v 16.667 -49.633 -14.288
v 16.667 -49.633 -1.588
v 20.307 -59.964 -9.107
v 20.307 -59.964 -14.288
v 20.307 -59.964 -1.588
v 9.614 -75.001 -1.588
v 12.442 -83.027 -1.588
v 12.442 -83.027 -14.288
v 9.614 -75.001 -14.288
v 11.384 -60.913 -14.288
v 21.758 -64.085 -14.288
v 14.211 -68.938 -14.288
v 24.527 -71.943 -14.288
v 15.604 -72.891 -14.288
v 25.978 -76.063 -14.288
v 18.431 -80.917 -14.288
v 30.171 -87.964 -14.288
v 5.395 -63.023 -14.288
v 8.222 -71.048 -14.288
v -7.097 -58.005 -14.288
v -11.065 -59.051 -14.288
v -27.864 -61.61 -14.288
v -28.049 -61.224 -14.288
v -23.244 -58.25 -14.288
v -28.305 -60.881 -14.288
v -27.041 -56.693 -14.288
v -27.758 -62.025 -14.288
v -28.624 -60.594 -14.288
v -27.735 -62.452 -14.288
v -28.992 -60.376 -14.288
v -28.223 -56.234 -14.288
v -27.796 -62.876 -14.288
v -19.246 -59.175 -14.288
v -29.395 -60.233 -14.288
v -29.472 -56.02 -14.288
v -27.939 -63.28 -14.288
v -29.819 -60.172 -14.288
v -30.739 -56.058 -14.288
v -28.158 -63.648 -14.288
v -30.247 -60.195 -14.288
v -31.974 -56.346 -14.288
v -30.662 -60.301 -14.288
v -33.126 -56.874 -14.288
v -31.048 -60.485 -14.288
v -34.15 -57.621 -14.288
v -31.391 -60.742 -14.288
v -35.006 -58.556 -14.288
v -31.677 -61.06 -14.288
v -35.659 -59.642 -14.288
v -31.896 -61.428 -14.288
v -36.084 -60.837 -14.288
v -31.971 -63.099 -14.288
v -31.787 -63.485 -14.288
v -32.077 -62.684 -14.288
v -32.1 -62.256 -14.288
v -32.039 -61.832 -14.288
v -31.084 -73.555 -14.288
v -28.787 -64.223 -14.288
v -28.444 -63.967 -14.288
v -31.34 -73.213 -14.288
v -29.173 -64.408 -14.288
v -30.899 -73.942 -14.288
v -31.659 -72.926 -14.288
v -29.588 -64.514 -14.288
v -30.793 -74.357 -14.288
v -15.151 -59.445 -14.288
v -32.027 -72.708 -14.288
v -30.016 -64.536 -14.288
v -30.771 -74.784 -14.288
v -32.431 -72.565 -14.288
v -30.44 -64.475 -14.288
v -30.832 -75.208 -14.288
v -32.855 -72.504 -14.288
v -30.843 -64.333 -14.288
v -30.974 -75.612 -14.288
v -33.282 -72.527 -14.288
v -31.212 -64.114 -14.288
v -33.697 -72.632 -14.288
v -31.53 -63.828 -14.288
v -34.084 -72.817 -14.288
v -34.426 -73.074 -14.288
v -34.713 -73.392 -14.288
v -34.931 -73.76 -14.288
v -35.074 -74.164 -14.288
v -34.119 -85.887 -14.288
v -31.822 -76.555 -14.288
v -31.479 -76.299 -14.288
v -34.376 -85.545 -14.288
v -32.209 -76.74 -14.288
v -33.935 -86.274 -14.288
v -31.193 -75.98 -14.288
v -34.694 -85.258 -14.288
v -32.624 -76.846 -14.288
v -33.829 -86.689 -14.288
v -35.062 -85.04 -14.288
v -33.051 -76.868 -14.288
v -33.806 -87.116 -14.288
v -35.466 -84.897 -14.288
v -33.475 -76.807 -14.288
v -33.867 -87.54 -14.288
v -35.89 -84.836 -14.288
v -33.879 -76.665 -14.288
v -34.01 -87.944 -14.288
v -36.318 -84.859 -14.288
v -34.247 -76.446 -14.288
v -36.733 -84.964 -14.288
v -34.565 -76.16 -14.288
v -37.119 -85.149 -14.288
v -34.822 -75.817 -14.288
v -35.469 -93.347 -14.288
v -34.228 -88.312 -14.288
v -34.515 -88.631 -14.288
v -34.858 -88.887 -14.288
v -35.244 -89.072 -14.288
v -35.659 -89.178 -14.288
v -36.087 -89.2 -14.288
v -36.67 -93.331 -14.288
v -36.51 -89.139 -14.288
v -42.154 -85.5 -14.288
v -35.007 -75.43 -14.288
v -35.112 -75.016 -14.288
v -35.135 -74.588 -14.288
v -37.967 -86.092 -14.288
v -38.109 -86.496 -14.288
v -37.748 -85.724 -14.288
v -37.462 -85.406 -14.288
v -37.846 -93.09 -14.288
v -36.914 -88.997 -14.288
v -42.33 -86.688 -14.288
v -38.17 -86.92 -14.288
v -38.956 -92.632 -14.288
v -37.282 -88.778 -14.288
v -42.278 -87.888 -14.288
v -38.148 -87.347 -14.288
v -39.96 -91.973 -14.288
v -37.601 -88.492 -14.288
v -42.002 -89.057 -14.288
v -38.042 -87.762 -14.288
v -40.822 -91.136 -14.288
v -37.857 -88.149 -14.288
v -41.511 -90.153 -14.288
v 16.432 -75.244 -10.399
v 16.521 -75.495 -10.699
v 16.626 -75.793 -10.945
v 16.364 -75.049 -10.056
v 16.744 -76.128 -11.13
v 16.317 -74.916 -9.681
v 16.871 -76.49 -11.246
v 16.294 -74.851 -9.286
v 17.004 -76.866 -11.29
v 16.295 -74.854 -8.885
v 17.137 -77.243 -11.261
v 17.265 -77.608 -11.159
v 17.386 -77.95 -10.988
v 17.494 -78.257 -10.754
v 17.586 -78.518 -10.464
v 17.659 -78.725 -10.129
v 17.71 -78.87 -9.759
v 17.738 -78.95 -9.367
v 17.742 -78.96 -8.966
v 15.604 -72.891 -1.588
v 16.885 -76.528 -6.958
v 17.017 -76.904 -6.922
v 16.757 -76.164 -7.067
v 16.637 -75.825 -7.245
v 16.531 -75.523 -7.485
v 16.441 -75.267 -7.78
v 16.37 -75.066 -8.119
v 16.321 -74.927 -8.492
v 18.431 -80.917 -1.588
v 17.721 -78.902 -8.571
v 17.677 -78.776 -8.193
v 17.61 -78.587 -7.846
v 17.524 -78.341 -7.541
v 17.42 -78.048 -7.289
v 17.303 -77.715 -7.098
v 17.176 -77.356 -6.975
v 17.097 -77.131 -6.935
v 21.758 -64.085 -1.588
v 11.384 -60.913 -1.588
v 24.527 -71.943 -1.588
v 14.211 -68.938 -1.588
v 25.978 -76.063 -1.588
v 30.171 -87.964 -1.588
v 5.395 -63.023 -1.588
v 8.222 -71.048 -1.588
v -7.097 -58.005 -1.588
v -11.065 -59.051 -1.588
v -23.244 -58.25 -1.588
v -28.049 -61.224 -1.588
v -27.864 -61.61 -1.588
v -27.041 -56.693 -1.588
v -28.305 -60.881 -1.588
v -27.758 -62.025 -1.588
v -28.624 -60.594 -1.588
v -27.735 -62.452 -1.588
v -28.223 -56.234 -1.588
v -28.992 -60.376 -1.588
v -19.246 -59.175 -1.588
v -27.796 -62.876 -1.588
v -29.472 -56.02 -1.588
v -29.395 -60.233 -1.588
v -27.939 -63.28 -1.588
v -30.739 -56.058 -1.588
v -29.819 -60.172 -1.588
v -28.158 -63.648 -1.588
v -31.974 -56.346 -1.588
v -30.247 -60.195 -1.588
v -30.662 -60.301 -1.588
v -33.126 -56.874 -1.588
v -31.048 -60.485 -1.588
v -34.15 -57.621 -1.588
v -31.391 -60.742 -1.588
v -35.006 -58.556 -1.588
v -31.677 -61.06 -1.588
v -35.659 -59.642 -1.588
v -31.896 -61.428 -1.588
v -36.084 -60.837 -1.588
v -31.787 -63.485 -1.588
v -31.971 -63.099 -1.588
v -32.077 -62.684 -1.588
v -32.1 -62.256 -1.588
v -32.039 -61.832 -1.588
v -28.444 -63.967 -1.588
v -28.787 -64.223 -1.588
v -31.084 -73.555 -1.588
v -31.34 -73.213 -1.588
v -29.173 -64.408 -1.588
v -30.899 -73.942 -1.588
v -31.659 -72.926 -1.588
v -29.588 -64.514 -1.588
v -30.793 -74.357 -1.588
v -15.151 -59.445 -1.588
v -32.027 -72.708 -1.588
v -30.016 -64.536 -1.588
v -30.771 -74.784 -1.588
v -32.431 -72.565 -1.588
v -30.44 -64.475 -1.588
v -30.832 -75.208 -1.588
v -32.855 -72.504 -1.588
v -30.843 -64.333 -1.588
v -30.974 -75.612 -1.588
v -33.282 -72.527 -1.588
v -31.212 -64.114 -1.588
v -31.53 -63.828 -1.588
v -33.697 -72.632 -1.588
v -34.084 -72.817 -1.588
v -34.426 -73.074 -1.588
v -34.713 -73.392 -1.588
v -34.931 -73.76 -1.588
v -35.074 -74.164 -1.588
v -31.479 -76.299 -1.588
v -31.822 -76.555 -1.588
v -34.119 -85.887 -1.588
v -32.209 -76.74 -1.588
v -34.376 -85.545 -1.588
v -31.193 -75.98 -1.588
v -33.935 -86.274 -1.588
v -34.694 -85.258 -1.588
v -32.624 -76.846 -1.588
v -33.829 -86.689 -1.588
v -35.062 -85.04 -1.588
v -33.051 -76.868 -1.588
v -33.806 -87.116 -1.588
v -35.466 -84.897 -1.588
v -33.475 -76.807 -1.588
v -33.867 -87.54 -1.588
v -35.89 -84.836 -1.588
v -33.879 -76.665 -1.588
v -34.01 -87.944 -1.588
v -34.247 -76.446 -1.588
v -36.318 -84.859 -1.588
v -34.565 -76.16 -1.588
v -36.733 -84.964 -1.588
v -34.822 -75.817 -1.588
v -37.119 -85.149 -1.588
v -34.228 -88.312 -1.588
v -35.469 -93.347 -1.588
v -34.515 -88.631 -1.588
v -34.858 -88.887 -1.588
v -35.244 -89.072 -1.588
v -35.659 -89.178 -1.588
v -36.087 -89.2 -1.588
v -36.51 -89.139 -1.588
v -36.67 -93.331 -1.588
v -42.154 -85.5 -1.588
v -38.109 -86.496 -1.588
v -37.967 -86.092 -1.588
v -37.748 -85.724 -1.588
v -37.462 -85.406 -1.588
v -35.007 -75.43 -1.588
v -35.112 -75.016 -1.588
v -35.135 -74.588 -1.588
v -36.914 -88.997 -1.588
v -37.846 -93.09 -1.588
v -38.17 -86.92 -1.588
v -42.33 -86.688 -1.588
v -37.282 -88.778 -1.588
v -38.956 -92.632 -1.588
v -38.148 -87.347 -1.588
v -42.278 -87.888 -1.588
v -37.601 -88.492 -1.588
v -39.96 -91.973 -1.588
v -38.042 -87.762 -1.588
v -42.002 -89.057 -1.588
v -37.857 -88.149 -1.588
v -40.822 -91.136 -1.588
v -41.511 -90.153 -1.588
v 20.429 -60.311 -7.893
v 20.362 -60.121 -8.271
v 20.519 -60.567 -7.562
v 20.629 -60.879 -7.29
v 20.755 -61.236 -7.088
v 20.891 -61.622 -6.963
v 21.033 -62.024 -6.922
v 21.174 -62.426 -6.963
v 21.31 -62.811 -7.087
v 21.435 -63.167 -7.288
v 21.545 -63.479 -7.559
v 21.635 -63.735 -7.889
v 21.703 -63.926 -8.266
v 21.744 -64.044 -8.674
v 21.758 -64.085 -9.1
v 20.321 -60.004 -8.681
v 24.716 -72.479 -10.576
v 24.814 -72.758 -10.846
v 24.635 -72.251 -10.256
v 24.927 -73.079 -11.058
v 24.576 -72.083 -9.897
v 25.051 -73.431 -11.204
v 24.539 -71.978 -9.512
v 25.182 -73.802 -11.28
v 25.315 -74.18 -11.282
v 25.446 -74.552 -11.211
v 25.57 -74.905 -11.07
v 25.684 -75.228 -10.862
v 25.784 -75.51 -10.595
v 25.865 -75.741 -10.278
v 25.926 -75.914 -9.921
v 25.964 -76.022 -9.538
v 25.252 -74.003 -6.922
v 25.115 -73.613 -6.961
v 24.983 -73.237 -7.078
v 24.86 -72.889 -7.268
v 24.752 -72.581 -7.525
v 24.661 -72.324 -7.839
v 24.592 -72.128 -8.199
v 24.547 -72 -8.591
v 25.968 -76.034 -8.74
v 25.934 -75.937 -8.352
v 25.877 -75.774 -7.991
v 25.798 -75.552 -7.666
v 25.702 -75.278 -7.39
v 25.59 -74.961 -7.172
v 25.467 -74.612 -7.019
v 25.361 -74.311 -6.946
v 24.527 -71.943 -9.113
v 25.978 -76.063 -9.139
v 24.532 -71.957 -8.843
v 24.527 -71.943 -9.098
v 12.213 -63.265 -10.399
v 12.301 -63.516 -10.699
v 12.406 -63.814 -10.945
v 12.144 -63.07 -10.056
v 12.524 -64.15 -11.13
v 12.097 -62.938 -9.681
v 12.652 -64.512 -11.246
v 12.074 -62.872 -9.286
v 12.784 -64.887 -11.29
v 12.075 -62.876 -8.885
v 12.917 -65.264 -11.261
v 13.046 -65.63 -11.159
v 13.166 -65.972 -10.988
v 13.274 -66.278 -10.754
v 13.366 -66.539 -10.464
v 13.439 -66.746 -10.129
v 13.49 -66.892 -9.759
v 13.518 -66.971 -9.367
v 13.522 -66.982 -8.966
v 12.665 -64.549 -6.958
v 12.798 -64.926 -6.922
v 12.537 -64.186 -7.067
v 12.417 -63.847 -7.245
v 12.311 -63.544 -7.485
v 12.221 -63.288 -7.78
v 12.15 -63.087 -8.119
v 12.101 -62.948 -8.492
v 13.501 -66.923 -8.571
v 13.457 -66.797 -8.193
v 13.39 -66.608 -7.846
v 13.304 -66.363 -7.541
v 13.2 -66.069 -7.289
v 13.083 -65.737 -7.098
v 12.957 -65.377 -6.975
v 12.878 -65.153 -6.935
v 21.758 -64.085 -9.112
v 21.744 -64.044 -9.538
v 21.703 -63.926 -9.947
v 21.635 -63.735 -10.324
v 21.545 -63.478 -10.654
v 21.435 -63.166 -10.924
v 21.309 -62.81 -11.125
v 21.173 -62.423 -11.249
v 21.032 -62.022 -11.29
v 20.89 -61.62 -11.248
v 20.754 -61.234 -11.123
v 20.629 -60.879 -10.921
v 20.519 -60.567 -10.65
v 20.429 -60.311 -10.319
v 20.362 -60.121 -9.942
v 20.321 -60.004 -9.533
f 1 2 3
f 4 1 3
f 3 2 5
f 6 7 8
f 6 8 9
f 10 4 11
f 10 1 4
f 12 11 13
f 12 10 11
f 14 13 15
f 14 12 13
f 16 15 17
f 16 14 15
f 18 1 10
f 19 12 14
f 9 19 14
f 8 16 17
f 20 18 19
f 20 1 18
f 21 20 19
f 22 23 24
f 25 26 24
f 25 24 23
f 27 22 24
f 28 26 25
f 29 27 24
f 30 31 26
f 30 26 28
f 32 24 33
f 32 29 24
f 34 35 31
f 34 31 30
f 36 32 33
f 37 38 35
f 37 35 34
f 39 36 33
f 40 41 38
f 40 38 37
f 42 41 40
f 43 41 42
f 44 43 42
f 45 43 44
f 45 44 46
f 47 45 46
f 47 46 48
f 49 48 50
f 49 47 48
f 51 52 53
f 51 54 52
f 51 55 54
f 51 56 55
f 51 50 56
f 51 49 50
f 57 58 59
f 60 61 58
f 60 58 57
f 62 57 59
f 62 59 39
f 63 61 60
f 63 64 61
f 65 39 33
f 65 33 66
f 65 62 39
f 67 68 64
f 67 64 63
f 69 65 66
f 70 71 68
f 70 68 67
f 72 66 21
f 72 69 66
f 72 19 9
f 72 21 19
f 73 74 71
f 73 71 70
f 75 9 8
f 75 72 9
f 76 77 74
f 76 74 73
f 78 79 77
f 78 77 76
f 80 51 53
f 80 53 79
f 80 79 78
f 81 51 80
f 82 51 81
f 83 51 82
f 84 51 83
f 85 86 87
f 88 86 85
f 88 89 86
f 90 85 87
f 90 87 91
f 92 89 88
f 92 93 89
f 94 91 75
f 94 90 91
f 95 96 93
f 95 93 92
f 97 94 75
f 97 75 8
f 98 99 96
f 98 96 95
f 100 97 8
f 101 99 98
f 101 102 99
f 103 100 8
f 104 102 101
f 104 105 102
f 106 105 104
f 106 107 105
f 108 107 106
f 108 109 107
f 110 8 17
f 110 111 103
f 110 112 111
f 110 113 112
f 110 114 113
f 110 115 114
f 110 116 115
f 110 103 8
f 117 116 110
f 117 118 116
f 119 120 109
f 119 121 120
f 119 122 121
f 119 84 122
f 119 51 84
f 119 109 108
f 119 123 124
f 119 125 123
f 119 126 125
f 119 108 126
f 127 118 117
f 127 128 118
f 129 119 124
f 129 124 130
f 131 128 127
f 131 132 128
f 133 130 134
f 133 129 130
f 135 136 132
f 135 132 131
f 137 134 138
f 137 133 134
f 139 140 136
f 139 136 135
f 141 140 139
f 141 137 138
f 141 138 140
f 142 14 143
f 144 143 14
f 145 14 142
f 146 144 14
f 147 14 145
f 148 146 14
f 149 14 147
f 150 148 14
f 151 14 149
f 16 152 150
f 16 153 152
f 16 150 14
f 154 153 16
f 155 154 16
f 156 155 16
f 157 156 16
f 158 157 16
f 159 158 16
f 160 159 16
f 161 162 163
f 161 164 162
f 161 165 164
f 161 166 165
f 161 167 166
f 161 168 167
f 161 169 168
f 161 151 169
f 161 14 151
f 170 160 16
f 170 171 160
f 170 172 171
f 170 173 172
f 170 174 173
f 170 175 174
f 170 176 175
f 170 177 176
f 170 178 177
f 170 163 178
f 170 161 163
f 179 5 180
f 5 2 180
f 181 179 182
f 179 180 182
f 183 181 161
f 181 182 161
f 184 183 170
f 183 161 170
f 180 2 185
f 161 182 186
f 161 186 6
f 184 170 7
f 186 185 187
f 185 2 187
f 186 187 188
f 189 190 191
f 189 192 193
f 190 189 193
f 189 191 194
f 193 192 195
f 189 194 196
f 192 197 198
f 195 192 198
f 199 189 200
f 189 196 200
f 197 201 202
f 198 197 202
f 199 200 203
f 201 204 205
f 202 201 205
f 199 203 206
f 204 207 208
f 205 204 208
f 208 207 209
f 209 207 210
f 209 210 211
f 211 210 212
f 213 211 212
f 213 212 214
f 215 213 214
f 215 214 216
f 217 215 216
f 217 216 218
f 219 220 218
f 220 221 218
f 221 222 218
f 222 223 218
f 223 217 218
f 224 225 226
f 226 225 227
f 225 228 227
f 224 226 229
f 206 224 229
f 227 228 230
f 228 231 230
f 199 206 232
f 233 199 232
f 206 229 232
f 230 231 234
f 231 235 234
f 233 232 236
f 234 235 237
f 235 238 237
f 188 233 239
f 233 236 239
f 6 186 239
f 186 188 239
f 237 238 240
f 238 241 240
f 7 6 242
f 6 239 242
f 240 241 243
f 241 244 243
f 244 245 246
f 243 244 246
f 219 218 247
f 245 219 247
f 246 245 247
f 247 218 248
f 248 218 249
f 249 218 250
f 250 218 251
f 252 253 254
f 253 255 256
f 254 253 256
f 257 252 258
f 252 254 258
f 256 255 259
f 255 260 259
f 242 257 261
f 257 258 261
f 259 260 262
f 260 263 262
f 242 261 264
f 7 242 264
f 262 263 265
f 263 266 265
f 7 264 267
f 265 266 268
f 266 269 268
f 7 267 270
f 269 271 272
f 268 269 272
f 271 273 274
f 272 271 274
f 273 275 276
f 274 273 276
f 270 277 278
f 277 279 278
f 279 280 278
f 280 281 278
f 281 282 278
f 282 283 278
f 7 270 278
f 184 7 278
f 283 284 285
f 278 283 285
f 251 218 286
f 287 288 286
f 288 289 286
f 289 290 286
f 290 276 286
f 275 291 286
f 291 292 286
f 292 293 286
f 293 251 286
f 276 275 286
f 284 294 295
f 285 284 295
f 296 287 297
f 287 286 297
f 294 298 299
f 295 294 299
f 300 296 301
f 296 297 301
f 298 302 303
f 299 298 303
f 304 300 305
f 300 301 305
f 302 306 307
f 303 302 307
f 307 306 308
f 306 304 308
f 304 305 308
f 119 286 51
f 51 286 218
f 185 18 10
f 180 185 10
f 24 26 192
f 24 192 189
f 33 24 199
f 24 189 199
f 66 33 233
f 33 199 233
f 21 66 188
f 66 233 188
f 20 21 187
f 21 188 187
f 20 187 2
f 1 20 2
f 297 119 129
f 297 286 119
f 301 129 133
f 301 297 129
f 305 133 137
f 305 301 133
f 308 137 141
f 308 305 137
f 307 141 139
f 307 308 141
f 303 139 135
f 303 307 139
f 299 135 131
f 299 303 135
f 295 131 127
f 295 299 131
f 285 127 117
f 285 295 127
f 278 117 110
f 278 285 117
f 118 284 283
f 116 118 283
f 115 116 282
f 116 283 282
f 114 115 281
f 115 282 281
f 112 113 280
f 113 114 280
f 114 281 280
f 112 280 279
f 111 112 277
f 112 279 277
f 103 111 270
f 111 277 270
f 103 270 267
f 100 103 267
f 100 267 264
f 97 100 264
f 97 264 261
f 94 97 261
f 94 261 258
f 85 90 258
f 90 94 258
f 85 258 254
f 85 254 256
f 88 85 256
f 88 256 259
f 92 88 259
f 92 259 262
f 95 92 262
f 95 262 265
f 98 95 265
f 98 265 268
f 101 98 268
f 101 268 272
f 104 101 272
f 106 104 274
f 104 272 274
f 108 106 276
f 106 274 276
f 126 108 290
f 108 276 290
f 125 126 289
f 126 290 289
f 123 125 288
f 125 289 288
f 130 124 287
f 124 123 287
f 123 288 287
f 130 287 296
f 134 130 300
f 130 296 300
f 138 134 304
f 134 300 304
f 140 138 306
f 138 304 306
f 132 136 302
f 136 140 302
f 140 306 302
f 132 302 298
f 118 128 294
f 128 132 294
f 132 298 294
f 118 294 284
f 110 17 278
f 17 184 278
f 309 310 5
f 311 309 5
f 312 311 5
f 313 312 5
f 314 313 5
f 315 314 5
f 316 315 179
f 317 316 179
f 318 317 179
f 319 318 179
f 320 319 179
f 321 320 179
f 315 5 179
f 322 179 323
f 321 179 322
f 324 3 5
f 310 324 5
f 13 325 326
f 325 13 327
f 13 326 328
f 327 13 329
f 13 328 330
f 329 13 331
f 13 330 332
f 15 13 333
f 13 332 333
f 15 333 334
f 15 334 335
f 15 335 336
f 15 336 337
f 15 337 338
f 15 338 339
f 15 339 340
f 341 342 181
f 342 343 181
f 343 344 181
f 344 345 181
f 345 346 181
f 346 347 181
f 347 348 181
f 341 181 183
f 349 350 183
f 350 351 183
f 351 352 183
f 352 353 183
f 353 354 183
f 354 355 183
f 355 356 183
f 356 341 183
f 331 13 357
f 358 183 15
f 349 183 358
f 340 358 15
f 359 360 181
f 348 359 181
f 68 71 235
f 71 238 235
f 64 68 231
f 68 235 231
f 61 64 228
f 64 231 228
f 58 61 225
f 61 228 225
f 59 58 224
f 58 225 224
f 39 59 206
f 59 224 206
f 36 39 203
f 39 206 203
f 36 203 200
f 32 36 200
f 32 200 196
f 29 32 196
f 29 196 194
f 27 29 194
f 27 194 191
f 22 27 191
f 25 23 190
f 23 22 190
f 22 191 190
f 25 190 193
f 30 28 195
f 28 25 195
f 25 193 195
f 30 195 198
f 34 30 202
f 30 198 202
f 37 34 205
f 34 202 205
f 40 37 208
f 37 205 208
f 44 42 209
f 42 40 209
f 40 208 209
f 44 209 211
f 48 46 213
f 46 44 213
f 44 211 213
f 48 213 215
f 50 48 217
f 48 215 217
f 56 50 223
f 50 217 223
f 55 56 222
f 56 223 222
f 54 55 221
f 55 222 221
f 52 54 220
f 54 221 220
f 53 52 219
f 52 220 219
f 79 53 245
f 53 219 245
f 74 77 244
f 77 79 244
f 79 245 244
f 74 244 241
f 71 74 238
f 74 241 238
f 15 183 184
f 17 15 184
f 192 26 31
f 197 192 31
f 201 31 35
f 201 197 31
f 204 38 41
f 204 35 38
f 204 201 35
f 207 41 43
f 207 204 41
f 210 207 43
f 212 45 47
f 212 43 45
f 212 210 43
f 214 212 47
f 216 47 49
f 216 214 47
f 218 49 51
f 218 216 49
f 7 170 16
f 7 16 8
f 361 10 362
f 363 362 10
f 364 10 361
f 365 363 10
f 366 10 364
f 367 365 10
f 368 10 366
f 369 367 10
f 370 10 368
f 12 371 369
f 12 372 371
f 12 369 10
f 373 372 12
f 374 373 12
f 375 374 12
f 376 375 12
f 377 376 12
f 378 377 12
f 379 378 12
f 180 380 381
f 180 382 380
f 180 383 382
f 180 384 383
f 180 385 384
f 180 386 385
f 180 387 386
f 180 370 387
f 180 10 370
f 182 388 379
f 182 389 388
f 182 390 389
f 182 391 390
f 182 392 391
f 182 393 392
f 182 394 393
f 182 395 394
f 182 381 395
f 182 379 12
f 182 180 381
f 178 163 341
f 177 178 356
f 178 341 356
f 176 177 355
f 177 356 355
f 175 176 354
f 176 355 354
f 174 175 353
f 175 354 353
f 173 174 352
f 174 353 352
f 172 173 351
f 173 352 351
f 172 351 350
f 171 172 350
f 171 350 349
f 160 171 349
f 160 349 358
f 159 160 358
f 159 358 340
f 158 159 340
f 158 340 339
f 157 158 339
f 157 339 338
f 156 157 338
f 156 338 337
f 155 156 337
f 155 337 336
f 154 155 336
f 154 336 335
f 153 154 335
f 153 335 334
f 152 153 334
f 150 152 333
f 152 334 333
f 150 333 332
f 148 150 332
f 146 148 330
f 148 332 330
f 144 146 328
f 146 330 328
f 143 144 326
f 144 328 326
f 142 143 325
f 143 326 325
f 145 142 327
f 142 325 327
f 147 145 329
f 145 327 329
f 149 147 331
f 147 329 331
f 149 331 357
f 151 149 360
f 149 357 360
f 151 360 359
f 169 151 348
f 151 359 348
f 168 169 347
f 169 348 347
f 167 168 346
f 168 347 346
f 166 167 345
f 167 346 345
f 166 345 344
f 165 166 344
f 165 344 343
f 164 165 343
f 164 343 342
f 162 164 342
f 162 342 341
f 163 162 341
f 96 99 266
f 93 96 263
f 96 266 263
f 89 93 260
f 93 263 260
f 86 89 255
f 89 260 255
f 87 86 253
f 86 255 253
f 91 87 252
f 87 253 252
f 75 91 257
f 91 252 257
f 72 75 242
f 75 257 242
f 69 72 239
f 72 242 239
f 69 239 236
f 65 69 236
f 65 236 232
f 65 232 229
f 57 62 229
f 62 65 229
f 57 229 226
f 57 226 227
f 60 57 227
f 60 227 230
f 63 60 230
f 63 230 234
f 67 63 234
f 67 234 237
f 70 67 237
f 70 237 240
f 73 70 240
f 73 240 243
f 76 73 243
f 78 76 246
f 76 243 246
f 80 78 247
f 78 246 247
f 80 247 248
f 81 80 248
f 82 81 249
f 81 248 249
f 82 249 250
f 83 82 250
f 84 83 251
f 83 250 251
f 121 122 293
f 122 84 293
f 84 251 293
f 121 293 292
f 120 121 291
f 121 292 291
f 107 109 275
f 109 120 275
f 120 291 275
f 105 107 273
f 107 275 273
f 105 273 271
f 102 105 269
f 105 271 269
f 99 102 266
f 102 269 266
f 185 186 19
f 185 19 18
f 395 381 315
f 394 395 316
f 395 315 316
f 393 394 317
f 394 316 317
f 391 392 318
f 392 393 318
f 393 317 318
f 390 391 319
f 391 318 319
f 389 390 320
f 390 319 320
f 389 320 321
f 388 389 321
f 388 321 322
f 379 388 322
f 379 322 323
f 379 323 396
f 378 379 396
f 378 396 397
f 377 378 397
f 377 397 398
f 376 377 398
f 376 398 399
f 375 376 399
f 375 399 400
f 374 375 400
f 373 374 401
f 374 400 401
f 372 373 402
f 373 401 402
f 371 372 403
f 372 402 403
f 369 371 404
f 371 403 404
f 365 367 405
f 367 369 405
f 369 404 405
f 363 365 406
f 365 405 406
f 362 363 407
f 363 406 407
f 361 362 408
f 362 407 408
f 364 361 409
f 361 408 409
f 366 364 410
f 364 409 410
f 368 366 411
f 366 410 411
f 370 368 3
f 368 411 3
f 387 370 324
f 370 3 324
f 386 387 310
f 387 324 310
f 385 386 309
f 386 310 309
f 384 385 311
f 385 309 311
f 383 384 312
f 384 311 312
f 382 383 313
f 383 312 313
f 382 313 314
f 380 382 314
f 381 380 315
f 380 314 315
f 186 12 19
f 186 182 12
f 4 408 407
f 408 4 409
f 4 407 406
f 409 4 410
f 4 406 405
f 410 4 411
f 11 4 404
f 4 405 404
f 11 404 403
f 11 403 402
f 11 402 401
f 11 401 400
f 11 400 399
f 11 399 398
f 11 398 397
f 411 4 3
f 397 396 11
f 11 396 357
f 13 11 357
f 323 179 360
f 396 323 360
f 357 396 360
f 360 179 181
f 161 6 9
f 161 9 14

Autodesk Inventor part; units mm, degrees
ref_plane "YZ Plane" through (0, 0, 0) normal (1, 0, 0) x (0, 1, 0)
ref_plane "Work Plane1" through (-2.4446, 6.0882, -1.5875) normal (0, 0, -1) x (-0.239, -0.971, 0)
sketch "Sketch1" plane through (-2.4446, 6.0882, -1.5875) normal (0, 0, -1) x (-0.239, -0.971, 0)
  circle A0 centre (85.725, 10.3187) radius 2.1844
  circle A1 centre (98.425, 10.3187) radius 2.1844
  circle A2 centre (73.025, 10.3187) radius 2.1844
  line L0 (73.025, 10.3187) -> (98.425, 10.3187) construction
  line L1 (73.025, 3.9687) -> (98.425, 3.9687) construction
  line L2 (98.425, 16.6687) -> (73.025, 16.6687)
  arc A3 (73.025, 16.6687) -> (66.8404, 8.879) centre (73.025, 10.3187) ccw
  arc A4 (98.425, 3.9687) -> (104.4463, 8.3022) centre (98.425, 10.3187) ccw construction
  line L3 (73.025, 3.9687) -> (63.3473, -10.8009) construction
  arc A5 (63.3473, -10.8009) -> (66.8404, 8.879) centre (42.1019, 3.1199) ccw
  line L4 (58.7003, -37.8788) -> (62.3545, -40.2732)
  line L5 (69.323, -44.8393) -> (72.9773, -47.2337)
  line L6 (63.3473, -10.8009) -> (49.5384, -31.8756)
  arc A6 (66.8404, 8.879) -> (73.025, 3.9687) centre (73.025, 10.3187) ccw construction
  arc A7 (104.4463, 8.3022) -> (98.425, 16.6687) centre (98.425, 10.3187) ccw
  line L7 (69.2168, -44.7697) -> (68.3468, -46.0975)
  line L8 (73.0835, -47.3033) -> (72.2134, -48.6311)
  line L9 (68.7818, -45.4336) -> (72.6485, -47.9672) construction
  line L10 (70.7151, -46.7004) -> (77.6756, -36.0777) construction
  line L11 (60.5274, -39.076) -> (67.0528, -29.1172) construction
  line L12 (65.2343, -24.1298) -> (61.7541, -29.4412)
  line L13 (61.7541, -29.4412) -> (68.8713, -34.1047)
  line L14 (68.8713, -34.1047) -> (72.3515, -28.7933)
  line L15 (72.3515, -28.7933) -> (65.2343, -24.1298)
  line L16 (65.2343, -24.1298) -> (68.8713, -34.1047) construction
  line L17 (61.7541, -29.4412) -> (72.3515, -28.7933) construction
  line L18 (75.857, -31.0902) -> (72.3768, -36.4016)
  line L19 (72.3768, -36.4016) -> (79.4941, -41.0651)
  line L20 (79.4941, -41.0651) -> (82.9743, -35.7537)
  line L21 (82.9743, -35.7537) -> (75.857, -31.0902)
  line L22 (75.857, -31.0902) -> (79.4941, -41.0651) construction
  line L23 (72.3768, -36.4016) -> (82.9743, -35.7537) construction
  line L24 (181.7138, -118.4821) -> (130.5502, -84.9577) construction
  line L25 (49.5384, -31.8756) -> (83.5311, -54.149)
  line L26 (83.5311, -54.149) -> (104.4463, 8.3022)
  point P0 (85.725, 10.3187)
  point P1 (58.7003, -37.8788)
  point P2 (62.3545, -40.2732)
  point P3 (72.9773, -47.2337)
  dimension "d5" = 12.7
  dimension "d6" = 25.4
  dimension "d9" = 12.7
  dimension "d11" = 12.7
  dimension "d12" = 8.509
  dimension "d13" = 8.509
  dimension "d14" = 6.35
  dimension "d15" = 6.35
  dimension "d16" = 40.64
ref_plane "Work Plane3" through (-129.6539, 63.7298, -14.2875) normal (0, 0, -1) x (-0.5481, 0.8364, 0)
extrude "Extrusion1" add sketch "Sketch1" along normal up to surface (12.7 mm away)
sketch "Sketch2" plane through (16.667, -49.633, -14.2875) normal (0.9432, 0.3323, 0) x (0, 0, 1)
  circle A0 centre (5.1816, 25.8379) radius 2.1844 projected
  circle A1 centre (5.1816, 13.1379) radius 2.1844 projected
  point P0 (14.2875, -52.351)
extrude "Extrusion2" cut sketch "Sketch2" against normal blind 12.7
properties part number "AngleSupport" material "Plastic, Opaque Black"
